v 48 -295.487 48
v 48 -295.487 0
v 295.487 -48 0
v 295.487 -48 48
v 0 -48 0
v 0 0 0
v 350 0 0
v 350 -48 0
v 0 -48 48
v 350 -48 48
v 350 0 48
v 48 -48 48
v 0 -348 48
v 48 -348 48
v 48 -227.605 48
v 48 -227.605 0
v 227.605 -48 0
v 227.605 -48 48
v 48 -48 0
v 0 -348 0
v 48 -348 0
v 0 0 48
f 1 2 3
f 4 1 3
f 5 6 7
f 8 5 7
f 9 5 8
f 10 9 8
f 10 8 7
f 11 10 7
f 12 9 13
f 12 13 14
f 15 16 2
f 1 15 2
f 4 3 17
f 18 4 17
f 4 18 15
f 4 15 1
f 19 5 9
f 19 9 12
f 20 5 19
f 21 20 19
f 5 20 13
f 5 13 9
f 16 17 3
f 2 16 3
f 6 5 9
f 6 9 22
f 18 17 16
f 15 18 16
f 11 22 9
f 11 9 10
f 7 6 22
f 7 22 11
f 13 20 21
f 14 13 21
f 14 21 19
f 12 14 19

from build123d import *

# Parameters (mm, degrees)
F1_W     = 350
F1_H     = 48
F2_DEPTH = 48
F3_W     = 48
F3_H     = 300
F4_DEPTH = 48
F6_DEPTH = 48


with BuildPart() as f2:
    # F1 (on Top) → F2 (new body)
    with BuildSketch(Plane.XY):
        with Locations((175, -24)):
            Rectangle(F1_W, F1_H)
    extrude(amount=F2_DEPTH)


with BuildPart() as f4:
    # F3 (on Top) → F4 (new body)
    with BuildSketch(Plane.XY):
        with Locations((24, -198)):
            Rectangle(F3_W, F3_H)
    extrude(amount=F4_DEPTH)


with BuildPart() as f6:
    # F5 (on Top) → F6 (new body)
    with BuildSketch(Plane.XY):
        Polygon((48, -295.4873734153), (295.4873734153, -48), (227.6051224214, -48), (48, -227.6051224214), align=None)
    extrude(amount=F6_DEPTH)


solid = Compound([f2.part, f4.part, f6.part])
